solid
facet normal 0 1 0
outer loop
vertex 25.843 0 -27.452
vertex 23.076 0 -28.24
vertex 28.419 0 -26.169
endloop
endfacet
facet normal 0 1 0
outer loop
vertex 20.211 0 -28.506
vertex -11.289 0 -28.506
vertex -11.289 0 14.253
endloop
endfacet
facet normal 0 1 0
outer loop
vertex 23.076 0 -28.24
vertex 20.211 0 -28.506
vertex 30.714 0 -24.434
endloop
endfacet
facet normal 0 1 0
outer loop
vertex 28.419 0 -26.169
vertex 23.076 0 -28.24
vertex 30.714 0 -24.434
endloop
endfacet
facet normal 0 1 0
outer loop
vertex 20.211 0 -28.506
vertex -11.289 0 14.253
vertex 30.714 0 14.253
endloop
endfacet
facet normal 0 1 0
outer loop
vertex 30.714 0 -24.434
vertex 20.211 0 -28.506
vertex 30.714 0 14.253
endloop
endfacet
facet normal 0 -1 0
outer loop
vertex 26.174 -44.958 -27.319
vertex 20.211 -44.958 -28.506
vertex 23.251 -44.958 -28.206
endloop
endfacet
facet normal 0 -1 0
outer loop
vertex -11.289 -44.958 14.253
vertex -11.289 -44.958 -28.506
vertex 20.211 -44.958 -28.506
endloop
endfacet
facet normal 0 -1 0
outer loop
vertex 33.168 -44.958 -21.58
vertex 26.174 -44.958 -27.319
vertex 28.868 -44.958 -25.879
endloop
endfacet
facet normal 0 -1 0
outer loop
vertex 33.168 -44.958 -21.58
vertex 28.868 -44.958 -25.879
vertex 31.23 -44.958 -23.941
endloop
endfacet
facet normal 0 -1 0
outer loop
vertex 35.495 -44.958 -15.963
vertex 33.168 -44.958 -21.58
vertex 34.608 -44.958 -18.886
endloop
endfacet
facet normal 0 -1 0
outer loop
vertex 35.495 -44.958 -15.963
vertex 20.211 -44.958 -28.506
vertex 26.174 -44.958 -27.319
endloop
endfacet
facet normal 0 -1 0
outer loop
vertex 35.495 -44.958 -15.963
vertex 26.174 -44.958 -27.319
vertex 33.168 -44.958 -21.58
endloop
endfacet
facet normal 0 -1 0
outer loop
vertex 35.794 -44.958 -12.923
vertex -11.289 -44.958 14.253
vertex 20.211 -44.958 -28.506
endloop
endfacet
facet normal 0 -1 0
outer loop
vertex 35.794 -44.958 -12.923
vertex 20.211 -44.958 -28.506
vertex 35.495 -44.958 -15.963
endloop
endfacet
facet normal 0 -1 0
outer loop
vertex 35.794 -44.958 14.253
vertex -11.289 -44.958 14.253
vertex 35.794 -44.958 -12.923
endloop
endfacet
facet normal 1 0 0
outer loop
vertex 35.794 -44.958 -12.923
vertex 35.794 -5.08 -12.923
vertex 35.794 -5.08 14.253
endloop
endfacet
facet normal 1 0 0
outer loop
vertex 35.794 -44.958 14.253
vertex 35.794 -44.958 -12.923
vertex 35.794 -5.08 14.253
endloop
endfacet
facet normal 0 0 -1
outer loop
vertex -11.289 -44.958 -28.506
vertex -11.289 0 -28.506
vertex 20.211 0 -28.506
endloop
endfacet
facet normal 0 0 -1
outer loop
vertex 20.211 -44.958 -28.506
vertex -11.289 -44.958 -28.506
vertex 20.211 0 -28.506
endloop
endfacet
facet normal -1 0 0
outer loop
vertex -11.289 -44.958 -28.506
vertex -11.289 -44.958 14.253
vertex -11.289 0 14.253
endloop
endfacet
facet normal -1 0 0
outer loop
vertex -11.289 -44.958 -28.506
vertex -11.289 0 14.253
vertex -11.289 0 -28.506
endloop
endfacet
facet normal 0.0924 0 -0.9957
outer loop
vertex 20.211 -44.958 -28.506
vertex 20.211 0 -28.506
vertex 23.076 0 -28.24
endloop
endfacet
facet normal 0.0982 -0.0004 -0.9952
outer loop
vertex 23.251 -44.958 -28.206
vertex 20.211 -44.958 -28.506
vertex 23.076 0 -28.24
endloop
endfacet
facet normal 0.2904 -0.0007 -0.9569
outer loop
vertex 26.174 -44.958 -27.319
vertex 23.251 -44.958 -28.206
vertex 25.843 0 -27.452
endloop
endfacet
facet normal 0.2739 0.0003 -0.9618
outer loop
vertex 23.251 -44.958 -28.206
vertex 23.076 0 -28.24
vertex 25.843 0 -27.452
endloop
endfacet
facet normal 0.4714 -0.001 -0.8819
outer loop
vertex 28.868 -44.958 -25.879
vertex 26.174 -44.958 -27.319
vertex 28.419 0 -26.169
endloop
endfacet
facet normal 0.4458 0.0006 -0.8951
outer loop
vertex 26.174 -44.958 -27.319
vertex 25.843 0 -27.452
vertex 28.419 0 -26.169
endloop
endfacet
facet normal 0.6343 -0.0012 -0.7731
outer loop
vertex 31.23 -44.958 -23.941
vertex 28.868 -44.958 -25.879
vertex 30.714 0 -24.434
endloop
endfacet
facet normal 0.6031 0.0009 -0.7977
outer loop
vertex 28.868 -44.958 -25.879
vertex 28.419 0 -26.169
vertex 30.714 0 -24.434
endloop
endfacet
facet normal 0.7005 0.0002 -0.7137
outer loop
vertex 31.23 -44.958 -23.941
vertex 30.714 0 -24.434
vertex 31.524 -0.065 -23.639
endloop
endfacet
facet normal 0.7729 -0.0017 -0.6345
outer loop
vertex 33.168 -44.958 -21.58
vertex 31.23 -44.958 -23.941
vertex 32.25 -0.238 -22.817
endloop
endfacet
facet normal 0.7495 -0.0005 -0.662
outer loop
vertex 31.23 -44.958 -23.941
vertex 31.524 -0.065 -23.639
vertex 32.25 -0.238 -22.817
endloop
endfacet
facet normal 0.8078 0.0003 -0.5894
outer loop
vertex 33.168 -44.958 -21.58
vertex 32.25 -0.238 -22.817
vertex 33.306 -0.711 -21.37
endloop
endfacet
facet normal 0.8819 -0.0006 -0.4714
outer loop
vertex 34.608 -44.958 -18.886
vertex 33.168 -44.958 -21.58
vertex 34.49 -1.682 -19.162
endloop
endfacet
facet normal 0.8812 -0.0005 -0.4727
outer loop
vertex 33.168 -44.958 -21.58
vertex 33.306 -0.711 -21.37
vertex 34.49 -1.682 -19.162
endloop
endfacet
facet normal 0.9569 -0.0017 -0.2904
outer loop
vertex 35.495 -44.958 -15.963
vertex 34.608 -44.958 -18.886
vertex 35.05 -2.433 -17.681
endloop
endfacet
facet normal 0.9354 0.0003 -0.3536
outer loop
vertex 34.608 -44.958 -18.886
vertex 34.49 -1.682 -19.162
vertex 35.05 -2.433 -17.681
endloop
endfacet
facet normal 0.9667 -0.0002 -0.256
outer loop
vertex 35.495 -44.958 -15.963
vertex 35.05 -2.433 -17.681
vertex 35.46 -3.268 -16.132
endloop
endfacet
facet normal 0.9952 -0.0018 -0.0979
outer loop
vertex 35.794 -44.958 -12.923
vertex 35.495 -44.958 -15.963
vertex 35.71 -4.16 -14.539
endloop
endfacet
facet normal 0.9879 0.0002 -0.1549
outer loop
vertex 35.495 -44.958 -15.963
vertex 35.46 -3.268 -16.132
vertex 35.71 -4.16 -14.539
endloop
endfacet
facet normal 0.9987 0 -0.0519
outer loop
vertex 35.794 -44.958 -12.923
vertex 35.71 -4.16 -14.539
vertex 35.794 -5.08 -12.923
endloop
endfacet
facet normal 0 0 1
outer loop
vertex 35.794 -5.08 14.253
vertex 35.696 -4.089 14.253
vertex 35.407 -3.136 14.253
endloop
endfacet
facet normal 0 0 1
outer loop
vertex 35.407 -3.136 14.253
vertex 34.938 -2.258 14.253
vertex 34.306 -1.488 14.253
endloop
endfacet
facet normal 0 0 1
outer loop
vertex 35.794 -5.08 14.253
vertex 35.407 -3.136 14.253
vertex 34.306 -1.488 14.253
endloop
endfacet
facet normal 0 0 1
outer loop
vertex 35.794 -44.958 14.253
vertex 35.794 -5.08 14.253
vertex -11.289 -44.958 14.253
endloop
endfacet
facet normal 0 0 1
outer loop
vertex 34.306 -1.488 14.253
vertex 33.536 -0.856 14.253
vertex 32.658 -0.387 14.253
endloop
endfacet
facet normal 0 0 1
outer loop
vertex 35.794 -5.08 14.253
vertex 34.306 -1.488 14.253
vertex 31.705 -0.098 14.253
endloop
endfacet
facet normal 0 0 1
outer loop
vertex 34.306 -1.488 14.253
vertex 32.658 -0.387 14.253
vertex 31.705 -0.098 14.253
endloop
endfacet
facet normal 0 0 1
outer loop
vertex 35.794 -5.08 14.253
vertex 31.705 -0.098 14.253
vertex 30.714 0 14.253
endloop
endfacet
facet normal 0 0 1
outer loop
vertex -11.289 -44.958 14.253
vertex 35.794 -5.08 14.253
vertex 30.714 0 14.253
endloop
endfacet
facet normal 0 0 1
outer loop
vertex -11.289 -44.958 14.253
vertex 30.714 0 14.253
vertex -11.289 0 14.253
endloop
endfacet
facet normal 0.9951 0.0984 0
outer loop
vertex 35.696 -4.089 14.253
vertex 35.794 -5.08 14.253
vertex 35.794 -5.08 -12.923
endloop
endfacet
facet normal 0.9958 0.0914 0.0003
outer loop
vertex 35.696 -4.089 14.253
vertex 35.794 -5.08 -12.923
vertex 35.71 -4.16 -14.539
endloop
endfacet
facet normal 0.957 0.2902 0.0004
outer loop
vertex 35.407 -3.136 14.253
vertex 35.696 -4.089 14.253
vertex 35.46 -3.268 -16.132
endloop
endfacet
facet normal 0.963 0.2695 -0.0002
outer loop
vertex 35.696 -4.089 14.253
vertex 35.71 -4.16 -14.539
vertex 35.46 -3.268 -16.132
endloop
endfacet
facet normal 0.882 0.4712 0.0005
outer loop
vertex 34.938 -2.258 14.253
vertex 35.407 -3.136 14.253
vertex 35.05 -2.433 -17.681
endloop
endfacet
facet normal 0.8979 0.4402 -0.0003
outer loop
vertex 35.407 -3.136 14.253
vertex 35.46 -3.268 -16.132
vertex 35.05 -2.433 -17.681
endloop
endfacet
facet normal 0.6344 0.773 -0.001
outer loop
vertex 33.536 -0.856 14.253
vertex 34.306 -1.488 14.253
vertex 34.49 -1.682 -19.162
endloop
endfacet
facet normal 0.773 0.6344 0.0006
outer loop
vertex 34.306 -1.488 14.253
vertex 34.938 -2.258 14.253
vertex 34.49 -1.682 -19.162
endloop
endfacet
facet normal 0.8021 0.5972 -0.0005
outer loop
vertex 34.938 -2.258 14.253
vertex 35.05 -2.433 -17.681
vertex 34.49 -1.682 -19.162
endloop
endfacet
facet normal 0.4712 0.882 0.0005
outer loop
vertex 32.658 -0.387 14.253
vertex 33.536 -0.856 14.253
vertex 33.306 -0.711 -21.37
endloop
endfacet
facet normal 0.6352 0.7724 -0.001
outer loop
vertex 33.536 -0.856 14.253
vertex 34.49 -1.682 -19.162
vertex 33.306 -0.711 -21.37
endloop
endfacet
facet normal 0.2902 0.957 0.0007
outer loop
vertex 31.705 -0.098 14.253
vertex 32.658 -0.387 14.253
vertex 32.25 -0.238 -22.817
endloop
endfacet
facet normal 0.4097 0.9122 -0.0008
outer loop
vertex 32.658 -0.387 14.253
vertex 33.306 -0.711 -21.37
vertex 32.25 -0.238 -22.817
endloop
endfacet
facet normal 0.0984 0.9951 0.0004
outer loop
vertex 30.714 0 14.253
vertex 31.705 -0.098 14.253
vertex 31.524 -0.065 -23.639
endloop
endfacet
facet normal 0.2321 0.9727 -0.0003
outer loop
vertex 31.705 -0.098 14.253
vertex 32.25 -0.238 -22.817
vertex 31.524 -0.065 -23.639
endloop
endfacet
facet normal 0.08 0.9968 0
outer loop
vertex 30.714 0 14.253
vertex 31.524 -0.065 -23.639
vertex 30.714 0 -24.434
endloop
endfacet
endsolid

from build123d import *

# Parameters (mm, degrees)
F1_DEPTH    = 44.958
F2_T1_DEPTH = 52.5754828874


# Not quite as in the source:
# - a fillet or chamfer that OpenCascade refuses, or shapes differently, is made with other operations: its cross-section is extruded or revolved along the edge and cut away or added


with BuildPart() as f1:
    # F0 (on Front) → F1 (new body)
    with BuildSketch(Plane.XZ):
        with BuildLine():
            Line((35.7939489186, 14.252791281), (-11.2892372768, 14.252791281))
            Line((-11.2892372768, 14.252791281), (-11.2892372768, -28.5055878506))
            Line((-11.2892372768, -28.5055878506), (20.2110526745, -28.5055878506))
            ThreePointArc((20.2110526745, -28.5055878506), (31.2298242792, -23.9414632112), (35.7939489186, -12.9226916064))
            Line((35.7939489186, -12.9226916064), (35.7939489186, 14.252791281))
        make_face()
    extrude(amount=F1_DEPTH)

    # F2: fillet of radius 5.08 on 1 edges, made by hand

    # F2_s2 → F2_t1 (cut)
    with BuildSketch(Plane.XY.offset(-25.6226916064)):
        with BuildLine():
            ThreePointArc((35.7939489186, -5.08), (34.306051367, -1.4878975516), (30.7139489186, 0))
            Line((30.7139489186, 0), (35.7939489186, 0))
            Line((35.7939489186, 0), (35.7939489186, -5.08))
        make_face()
    extrude(amount=F2_T1_DEPTH, mode=Mode.SUBTRACT)


solid = f1.part
